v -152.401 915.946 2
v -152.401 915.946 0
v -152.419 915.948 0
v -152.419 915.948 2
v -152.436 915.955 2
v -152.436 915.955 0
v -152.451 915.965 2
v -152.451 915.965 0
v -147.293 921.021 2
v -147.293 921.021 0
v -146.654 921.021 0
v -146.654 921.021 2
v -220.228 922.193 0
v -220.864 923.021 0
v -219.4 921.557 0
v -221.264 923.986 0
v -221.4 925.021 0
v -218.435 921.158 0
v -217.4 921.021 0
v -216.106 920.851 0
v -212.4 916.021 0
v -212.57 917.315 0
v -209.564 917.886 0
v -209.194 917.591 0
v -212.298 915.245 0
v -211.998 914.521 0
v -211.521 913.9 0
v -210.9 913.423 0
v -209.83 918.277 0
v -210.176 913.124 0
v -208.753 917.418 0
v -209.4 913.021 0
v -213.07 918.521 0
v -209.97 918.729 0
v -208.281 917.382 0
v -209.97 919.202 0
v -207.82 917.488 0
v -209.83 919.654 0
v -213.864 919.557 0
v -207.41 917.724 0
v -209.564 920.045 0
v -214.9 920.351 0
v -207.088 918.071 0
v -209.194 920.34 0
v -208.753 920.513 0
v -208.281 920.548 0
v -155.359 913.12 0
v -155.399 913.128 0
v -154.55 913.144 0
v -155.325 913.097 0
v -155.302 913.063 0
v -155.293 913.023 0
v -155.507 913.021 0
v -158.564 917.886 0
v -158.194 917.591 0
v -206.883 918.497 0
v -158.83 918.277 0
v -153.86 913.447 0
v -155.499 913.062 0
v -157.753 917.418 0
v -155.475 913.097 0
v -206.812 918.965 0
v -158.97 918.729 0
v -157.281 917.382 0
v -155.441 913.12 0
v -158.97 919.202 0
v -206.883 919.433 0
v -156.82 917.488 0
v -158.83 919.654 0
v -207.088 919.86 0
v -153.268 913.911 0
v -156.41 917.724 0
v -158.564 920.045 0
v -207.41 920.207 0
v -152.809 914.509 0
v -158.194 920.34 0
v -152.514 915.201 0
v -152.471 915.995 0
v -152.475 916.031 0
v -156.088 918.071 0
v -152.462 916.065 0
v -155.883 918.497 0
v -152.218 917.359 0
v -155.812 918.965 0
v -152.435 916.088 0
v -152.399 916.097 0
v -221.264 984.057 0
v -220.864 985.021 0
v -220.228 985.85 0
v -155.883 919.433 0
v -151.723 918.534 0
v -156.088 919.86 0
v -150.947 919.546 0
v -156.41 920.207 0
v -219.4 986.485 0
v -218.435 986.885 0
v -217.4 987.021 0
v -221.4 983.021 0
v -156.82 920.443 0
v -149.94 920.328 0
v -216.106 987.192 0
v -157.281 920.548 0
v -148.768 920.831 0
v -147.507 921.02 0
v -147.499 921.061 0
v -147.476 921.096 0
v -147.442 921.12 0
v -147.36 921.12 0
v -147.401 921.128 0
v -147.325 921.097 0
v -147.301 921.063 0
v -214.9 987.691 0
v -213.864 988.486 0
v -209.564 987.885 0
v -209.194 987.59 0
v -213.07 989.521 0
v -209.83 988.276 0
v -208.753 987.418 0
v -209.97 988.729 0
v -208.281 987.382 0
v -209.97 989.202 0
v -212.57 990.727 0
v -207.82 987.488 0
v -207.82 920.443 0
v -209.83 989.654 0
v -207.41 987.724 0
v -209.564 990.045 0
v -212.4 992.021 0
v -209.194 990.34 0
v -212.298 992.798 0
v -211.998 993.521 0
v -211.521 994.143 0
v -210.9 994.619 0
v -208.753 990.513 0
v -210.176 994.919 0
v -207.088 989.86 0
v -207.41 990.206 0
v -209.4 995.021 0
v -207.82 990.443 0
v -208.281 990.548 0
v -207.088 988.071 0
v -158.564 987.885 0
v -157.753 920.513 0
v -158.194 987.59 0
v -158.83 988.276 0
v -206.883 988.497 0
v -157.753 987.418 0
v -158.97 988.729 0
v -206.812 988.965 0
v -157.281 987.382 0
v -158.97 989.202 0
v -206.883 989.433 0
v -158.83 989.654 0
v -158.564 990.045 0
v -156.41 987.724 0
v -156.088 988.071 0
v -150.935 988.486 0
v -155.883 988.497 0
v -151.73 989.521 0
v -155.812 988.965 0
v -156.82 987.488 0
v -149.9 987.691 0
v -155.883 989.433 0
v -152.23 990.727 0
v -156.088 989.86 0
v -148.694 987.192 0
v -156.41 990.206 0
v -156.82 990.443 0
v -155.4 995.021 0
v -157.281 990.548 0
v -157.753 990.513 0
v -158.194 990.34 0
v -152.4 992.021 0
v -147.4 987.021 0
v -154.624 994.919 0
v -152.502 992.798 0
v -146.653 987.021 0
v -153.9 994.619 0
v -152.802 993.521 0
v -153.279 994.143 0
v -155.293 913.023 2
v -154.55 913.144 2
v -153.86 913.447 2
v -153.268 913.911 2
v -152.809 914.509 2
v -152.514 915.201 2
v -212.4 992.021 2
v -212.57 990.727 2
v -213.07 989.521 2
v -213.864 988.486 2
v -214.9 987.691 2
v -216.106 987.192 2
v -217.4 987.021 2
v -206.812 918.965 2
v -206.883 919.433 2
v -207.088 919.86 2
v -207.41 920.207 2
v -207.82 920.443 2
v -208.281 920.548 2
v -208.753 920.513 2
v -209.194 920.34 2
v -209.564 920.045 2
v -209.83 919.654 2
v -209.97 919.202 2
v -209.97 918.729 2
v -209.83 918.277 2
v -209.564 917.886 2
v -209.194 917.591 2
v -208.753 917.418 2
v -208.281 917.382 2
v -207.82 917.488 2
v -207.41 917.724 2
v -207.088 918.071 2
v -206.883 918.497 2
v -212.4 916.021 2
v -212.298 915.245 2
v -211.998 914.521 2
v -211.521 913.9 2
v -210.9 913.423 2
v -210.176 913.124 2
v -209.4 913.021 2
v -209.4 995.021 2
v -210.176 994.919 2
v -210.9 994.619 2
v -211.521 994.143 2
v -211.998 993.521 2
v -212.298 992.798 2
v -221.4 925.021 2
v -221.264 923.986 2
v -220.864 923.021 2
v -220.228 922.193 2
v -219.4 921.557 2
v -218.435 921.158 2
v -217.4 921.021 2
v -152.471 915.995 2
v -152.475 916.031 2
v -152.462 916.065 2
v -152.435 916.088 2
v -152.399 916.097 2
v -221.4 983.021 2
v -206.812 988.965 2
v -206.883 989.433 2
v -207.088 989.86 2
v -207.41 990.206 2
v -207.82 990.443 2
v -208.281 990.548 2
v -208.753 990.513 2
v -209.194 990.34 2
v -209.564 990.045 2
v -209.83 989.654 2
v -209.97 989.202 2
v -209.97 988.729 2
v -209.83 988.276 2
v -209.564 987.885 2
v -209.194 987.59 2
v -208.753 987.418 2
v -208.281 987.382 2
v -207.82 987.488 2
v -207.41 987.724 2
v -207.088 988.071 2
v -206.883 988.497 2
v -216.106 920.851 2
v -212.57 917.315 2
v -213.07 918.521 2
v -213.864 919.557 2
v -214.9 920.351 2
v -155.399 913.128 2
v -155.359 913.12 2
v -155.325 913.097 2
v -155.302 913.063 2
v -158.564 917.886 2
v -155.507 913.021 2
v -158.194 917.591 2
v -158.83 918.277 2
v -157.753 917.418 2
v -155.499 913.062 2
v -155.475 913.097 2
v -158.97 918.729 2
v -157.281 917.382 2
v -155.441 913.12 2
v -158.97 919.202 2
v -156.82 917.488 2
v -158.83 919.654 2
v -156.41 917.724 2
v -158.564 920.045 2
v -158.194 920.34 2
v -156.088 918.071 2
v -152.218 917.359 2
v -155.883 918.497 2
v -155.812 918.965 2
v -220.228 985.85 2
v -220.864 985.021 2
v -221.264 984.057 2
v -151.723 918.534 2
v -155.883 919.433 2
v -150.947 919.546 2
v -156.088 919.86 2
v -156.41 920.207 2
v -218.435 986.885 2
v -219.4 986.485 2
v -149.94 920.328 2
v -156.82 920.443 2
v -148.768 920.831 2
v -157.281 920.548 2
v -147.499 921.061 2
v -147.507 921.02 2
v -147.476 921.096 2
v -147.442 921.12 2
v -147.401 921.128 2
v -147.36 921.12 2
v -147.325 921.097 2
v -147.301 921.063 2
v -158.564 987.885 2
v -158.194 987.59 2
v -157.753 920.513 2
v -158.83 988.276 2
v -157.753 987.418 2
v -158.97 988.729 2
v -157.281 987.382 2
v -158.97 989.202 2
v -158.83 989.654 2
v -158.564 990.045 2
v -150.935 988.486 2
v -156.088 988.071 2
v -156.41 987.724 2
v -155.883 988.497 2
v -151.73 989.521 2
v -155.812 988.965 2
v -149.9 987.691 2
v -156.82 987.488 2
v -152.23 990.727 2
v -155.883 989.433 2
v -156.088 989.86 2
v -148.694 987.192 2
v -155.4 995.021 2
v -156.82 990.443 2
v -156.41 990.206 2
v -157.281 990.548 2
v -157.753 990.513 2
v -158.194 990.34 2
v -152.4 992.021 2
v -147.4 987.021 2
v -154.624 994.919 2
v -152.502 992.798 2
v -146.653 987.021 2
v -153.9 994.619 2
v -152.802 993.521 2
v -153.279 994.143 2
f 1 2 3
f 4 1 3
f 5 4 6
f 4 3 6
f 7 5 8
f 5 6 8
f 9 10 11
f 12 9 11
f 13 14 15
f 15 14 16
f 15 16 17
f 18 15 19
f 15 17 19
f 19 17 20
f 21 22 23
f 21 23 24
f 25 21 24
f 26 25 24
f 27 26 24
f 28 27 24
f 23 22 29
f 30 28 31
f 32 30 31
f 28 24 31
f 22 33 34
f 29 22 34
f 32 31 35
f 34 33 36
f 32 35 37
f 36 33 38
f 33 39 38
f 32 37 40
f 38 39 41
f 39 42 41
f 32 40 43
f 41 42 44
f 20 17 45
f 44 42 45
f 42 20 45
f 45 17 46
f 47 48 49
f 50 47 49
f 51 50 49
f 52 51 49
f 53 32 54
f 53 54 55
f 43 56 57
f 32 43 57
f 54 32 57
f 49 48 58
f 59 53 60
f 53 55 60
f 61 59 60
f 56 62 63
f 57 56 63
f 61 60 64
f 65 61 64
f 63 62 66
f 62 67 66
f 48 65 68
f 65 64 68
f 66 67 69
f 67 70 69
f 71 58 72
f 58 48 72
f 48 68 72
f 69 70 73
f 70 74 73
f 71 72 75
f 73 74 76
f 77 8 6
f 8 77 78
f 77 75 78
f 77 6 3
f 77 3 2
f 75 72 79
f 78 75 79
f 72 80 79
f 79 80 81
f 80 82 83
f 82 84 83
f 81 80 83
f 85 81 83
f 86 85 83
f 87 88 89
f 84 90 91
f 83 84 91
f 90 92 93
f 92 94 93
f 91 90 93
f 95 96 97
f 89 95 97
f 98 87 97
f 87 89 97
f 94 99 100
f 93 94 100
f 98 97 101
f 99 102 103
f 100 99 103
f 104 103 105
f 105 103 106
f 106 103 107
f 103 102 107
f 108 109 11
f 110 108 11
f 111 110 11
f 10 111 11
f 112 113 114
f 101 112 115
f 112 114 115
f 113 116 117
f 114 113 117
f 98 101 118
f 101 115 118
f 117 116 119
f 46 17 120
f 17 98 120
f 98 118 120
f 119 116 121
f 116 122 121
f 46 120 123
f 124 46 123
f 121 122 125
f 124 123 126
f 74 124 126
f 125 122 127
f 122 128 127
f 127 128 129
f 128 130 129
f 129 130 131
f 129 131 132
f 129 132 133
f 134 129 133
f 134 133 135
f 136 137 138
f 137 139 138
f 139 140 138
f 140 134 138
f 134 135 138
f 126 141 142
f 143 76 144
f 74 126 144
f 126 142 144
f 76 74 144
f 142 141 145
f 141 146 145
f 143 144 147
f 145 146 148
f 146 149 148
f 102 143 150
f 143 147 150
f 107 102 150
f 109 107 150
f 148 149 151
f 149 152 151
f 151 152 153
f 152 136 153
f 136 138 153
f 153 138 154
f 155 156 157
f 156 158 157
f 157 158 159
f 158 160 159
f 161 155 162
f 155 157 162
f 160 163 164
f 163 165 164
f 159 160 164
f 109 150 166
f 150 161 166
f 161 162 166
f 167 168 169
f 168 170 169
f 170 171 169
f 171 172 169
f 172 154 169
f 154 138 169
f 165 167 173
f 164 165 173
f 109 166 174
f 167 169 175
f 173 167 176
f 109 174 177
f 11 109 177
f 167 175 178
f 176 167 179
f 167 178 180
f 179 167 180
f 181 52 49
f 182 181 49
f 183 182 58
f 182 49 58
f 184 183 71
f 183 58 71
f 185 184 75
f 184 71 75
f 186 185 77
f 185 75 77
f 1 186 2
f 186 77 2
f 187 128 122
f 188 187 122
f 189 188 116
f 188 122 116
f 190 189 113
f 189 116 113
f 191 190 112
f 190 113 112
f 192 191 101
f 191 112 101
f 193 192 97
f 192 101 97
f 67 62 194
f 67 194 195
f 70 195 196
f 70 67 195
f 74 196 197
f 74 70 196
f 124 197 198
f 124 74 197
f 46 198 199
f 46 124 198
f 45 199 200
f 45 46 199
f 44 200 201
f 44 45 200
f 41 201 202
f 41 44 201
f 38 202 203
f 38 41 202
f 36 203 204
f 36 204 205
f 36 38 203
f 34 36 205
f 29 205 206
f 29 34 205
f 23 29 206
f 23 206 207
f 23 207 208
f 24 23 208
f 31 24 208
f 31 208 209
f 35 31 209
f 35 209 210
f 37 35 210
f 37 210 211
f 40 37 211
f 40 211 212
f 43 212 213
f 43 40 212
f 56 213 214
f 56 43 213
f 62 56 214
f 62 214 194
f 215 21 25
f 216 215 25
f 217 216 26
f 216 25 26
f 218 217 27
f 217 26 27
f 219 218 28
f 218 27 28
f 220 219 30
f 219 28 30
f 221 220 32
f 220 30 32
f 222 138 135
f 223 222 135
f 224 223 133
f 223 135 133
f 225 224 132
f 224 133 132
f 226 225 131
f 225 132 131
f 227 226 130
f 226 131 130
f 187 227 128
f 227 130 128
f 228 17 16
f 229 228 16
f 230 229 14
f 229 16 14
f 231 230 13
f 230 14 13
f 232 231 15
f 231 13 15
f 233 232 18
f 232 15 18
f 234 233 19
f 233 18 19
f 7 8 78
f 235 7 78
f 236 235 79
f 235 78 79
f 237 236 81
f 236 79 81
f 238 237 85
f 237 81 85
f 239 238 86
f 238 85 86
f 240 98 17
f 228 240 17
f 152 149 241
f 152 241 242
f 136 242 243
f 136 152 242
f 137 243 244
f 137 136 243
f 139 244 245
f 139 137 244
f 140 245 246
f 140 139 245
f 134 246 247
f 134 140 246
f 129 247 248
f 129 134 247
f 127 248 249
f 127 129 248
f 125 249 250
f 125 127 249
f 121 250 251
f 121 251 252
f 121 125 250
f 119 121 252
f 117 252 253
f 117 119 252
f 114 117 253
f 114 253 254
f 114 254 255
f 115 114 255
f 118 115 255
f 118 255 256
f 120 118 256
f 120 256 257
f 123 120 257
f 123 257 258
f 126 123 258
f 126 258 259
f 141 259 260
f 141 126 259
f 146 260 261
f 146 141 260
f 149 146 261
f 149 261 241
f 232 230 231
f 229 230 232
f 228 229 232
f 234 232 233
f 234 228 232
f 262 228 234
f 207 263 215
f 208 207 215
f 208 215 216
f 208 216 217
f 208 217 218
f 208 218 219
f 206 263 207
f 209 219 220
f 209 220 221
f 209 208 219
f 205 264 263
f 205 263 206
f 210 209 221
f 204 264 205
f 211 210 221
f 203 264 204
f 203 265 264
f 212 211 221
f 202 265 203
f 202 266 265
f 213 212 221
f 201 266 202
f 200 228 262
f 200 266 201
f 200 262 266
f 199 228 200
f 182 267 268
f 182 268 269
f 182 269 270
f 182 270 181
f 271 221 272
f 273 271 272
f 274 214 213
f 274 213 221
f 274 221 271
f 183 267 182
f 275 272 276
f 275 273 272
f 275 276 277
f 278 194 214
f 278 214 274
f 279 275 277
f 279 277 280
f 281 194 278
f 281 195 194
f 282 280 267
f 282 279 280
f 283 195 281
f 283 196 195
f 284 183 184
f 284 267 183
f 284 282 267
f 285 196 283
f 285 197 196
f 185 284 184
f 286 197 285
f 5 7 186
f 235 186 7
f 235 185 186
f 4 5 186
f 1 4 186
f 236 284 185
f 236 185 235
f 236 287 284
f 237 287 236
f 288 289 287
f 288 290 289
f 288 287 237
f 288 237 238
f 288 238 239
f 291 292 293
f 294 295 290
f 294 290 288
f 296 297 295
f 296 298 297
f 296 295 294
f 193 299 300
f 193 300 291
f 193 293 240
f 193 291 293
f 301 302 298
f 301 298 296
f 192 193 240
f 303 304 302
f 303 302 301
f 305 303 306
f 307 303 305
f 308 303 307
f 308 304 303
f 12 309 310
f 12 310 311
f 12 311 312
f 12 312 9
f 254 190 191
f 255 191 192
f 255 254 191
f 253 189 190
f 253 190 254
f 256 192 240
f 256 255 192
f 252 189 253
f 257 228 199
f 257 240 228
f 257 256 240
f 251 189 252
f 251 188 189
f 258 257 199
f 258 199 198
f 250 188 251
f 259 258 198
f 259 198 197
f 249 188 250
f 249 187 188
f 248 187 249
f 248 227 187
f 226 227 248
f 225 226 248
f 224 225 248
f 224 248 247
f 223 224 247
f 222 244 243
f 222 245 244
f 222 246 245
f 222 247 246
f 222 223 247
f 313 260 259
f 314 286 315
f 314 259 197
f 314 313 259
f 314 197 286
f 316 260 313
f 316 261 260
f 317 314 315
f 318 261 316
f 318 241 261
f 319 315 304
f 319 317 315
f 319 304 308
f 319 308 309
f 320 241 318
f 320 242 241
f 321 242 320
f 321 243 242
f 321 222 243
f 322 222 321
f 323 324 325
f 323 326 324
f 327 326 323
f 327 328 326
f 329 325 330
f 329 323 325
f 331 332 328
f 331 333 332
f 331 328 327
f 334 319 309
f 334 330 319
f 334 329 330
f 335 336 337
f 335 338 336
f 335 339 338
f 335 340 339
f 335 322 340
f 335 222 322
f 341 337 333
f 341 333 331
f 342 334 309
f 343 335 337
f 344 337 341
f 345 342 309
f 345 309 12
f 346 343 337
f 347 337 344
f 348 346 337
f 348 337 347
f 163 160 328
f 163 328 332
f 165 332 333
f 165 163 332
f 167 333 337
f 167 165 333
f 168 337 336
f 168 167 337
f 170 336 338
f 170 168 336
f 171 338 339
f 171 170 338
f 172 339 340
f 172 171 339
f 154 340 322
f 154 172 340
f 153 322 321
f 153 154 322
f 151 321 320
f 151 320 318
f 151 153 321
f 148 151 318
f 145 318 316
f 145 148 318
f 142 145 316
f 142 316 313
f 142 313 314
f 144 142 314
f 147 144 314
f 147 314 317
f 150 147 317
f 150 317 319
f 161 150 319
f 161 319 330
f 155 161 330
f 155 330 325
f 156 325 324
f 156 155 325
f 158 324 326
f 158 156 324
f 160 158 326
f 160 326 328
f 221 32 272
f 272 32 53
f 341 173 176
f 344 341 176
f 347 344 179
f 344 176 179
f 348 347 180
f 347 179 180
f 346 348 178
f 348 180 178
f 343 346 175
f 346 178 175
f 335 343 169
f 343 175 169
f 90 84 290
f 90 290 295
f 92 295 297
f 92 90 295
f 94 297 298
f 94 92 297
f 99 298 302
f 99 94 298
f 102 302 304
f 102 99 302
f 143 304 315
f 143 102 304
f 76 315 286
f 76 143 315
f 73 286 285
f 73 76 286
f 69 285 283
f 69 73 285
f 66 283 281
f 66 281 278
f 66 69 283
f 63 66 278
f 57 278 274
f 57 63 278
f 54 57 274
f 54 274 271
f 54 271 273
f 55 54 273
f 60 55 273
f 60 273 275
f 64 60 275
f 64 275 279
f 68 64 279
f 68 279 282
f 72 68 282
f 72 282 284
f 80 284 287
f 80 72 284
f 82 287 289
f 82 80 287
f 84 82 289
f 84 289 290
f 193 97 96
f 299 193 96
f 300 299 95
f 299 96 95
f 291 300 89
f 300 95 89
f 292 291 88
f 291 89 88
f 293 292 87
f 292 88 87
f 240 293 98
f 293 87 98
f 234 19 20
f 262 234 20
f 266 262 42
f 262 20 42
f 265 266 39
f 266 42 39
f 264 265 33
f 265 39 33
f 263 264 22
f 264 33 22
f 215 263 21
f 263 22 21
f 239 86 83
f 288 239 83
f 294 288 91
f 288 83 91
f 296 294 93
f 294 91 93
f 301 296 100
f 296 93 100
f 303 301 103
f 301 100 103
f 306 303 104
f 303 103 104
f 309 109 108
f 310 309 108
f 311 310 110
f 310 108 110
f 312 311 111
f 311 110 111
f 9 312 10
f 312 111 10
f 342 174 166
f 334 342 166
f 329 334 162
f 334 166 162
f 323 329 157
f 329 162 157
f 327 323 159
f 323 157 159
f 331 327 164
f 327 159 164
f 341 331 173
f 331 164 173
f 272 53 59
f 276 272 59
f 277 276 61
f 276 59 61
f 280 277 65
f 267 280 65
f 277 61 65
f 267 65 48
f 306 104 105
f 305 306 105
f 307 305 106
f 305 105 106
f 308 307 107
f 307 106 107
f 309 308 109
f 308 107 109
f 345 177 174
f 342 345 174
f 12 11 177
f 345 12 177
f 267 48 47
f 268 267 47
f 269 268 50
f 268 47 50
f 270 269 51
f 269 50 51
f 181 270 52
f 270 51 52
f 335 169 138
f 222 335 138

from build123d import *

# Parameters (mm, degrees)
MODEL_R             = 1.587496825
BOSS_EXTRUDE1_DEPTH = 2


with BuildPart() as part:
    # Model → Boss-Extrude1 (new body)
    with BuildSketch(Plane.XY):
        with BuildLine():
            Line((-146.653910016, 921.021419751), (-146.653491939, 987.021287754))
            Line((-146.653491939, 987.021287754), (-147.399894202, 987.021287754))
            ThreePointArc((-147.399894202, 987.021287754), (-150.935437408, 988.485719341), (-152.399999963, 992.021208297))
            ThreePointArc((-152.399999963, 992.021208297), (-153.278698205, 994.142573511), (-155.400063419, 995.021271753))
            Line((-155.400063419, 995.021271753), (-209.399816512, 995.021271753))
            ThreePointArc((-209.399816512, 995.021271753), (-211.521116241, 994.142638994), (-212.399879965, 992.021393514))
            ThreePointArc((-212.399879965, 992.021393514), (-213.864303366, 988.485858493), (-217.399777355, 987.021287754))
            ThreePointArc((-217.399777355, 987.021287754), (-220.228264308, 985.849690097), (-221.399861964, 983.021203145))
            Line((-221.399861964, 983.021203145), (-221.399861964, 925.021411752))
            ThreePointArc((-221.399861964, 925.021411752), (-220.228216634, 922.192969733), (-217.39973512, 921.02141975))
            ThreePointArc((-217.39973512, 921.02141975), (-213.864288435, 919.55683408), (-212.399879966, 916.021313993))
            ThreePointArc((-212.399879966, 916.021313993), (-211.521116244, 913.900068513), (-209.399816515, 913.021435753))
            Line((-209.399816515, 913.021435753), (-155.506885764, 913.021435753))
            ThreePointArc((-155.506885764, 913.021435753), (-155.475395221, 913.097173017), (-155.399490011, 913.128256561))
            ThreePointArc((-155.399490011, 913.128256561), (-155.324999759, 913.097438787), (-155.293258, 913.023337548))
            ThreePointArc((-155.293258, 913.023337548), (-153.267730715, 913.91115848), (-152.400955638, 915.945780743))
            ThreePointArc((-152.400955638, 915.945780743), (-152.427675956, 915.951027262), (-152.450799863, 915.965407327))
            ThreePointArc((-152.450799863, 915.965407327), (-152.470357006, 916.048810735), (-152.399429358, 916.096851124))
            ThreePointArc((-152.399429358, 916.096851124), (-150.946546283, 919.545844687), (-147.506710495, 921.020278673))
            ThreePointArc((-147.506710495, 921.020278673), (-147.476166718, 921.096209628), (-147.400849891, 921.128237863))
            ThreePointArc((-147.400849891, 921.128237863), (-147.324698014, 921.09729172), (-147.293071814, 921.021419751))
            Line((-147.293071814, 921.021419751), (-146.653910016, 921.021419751))
        make_face()
        with Locations((-208.399887964, 918.965401326)):
            Circle(MODEL_R, mode=Mode.SUBTRACT)
        with Locations((-157.399989964, 918.965401326)):
            Circle(MODEL_R, mode=Mode.SUBTRACT)
        with Locations((-208.399887964, 988.965261326)):
            Circle(MODEL_R, mode=Mode.SUBTRACT)
        with Locations((-157.399989964, 988.965261326)):
            Circle(MODEL_R, mode=Mode.SUBTRACT)
    extrude(amount=BOSS_EXTRUDE1_DEPTH)


solid = part.part
